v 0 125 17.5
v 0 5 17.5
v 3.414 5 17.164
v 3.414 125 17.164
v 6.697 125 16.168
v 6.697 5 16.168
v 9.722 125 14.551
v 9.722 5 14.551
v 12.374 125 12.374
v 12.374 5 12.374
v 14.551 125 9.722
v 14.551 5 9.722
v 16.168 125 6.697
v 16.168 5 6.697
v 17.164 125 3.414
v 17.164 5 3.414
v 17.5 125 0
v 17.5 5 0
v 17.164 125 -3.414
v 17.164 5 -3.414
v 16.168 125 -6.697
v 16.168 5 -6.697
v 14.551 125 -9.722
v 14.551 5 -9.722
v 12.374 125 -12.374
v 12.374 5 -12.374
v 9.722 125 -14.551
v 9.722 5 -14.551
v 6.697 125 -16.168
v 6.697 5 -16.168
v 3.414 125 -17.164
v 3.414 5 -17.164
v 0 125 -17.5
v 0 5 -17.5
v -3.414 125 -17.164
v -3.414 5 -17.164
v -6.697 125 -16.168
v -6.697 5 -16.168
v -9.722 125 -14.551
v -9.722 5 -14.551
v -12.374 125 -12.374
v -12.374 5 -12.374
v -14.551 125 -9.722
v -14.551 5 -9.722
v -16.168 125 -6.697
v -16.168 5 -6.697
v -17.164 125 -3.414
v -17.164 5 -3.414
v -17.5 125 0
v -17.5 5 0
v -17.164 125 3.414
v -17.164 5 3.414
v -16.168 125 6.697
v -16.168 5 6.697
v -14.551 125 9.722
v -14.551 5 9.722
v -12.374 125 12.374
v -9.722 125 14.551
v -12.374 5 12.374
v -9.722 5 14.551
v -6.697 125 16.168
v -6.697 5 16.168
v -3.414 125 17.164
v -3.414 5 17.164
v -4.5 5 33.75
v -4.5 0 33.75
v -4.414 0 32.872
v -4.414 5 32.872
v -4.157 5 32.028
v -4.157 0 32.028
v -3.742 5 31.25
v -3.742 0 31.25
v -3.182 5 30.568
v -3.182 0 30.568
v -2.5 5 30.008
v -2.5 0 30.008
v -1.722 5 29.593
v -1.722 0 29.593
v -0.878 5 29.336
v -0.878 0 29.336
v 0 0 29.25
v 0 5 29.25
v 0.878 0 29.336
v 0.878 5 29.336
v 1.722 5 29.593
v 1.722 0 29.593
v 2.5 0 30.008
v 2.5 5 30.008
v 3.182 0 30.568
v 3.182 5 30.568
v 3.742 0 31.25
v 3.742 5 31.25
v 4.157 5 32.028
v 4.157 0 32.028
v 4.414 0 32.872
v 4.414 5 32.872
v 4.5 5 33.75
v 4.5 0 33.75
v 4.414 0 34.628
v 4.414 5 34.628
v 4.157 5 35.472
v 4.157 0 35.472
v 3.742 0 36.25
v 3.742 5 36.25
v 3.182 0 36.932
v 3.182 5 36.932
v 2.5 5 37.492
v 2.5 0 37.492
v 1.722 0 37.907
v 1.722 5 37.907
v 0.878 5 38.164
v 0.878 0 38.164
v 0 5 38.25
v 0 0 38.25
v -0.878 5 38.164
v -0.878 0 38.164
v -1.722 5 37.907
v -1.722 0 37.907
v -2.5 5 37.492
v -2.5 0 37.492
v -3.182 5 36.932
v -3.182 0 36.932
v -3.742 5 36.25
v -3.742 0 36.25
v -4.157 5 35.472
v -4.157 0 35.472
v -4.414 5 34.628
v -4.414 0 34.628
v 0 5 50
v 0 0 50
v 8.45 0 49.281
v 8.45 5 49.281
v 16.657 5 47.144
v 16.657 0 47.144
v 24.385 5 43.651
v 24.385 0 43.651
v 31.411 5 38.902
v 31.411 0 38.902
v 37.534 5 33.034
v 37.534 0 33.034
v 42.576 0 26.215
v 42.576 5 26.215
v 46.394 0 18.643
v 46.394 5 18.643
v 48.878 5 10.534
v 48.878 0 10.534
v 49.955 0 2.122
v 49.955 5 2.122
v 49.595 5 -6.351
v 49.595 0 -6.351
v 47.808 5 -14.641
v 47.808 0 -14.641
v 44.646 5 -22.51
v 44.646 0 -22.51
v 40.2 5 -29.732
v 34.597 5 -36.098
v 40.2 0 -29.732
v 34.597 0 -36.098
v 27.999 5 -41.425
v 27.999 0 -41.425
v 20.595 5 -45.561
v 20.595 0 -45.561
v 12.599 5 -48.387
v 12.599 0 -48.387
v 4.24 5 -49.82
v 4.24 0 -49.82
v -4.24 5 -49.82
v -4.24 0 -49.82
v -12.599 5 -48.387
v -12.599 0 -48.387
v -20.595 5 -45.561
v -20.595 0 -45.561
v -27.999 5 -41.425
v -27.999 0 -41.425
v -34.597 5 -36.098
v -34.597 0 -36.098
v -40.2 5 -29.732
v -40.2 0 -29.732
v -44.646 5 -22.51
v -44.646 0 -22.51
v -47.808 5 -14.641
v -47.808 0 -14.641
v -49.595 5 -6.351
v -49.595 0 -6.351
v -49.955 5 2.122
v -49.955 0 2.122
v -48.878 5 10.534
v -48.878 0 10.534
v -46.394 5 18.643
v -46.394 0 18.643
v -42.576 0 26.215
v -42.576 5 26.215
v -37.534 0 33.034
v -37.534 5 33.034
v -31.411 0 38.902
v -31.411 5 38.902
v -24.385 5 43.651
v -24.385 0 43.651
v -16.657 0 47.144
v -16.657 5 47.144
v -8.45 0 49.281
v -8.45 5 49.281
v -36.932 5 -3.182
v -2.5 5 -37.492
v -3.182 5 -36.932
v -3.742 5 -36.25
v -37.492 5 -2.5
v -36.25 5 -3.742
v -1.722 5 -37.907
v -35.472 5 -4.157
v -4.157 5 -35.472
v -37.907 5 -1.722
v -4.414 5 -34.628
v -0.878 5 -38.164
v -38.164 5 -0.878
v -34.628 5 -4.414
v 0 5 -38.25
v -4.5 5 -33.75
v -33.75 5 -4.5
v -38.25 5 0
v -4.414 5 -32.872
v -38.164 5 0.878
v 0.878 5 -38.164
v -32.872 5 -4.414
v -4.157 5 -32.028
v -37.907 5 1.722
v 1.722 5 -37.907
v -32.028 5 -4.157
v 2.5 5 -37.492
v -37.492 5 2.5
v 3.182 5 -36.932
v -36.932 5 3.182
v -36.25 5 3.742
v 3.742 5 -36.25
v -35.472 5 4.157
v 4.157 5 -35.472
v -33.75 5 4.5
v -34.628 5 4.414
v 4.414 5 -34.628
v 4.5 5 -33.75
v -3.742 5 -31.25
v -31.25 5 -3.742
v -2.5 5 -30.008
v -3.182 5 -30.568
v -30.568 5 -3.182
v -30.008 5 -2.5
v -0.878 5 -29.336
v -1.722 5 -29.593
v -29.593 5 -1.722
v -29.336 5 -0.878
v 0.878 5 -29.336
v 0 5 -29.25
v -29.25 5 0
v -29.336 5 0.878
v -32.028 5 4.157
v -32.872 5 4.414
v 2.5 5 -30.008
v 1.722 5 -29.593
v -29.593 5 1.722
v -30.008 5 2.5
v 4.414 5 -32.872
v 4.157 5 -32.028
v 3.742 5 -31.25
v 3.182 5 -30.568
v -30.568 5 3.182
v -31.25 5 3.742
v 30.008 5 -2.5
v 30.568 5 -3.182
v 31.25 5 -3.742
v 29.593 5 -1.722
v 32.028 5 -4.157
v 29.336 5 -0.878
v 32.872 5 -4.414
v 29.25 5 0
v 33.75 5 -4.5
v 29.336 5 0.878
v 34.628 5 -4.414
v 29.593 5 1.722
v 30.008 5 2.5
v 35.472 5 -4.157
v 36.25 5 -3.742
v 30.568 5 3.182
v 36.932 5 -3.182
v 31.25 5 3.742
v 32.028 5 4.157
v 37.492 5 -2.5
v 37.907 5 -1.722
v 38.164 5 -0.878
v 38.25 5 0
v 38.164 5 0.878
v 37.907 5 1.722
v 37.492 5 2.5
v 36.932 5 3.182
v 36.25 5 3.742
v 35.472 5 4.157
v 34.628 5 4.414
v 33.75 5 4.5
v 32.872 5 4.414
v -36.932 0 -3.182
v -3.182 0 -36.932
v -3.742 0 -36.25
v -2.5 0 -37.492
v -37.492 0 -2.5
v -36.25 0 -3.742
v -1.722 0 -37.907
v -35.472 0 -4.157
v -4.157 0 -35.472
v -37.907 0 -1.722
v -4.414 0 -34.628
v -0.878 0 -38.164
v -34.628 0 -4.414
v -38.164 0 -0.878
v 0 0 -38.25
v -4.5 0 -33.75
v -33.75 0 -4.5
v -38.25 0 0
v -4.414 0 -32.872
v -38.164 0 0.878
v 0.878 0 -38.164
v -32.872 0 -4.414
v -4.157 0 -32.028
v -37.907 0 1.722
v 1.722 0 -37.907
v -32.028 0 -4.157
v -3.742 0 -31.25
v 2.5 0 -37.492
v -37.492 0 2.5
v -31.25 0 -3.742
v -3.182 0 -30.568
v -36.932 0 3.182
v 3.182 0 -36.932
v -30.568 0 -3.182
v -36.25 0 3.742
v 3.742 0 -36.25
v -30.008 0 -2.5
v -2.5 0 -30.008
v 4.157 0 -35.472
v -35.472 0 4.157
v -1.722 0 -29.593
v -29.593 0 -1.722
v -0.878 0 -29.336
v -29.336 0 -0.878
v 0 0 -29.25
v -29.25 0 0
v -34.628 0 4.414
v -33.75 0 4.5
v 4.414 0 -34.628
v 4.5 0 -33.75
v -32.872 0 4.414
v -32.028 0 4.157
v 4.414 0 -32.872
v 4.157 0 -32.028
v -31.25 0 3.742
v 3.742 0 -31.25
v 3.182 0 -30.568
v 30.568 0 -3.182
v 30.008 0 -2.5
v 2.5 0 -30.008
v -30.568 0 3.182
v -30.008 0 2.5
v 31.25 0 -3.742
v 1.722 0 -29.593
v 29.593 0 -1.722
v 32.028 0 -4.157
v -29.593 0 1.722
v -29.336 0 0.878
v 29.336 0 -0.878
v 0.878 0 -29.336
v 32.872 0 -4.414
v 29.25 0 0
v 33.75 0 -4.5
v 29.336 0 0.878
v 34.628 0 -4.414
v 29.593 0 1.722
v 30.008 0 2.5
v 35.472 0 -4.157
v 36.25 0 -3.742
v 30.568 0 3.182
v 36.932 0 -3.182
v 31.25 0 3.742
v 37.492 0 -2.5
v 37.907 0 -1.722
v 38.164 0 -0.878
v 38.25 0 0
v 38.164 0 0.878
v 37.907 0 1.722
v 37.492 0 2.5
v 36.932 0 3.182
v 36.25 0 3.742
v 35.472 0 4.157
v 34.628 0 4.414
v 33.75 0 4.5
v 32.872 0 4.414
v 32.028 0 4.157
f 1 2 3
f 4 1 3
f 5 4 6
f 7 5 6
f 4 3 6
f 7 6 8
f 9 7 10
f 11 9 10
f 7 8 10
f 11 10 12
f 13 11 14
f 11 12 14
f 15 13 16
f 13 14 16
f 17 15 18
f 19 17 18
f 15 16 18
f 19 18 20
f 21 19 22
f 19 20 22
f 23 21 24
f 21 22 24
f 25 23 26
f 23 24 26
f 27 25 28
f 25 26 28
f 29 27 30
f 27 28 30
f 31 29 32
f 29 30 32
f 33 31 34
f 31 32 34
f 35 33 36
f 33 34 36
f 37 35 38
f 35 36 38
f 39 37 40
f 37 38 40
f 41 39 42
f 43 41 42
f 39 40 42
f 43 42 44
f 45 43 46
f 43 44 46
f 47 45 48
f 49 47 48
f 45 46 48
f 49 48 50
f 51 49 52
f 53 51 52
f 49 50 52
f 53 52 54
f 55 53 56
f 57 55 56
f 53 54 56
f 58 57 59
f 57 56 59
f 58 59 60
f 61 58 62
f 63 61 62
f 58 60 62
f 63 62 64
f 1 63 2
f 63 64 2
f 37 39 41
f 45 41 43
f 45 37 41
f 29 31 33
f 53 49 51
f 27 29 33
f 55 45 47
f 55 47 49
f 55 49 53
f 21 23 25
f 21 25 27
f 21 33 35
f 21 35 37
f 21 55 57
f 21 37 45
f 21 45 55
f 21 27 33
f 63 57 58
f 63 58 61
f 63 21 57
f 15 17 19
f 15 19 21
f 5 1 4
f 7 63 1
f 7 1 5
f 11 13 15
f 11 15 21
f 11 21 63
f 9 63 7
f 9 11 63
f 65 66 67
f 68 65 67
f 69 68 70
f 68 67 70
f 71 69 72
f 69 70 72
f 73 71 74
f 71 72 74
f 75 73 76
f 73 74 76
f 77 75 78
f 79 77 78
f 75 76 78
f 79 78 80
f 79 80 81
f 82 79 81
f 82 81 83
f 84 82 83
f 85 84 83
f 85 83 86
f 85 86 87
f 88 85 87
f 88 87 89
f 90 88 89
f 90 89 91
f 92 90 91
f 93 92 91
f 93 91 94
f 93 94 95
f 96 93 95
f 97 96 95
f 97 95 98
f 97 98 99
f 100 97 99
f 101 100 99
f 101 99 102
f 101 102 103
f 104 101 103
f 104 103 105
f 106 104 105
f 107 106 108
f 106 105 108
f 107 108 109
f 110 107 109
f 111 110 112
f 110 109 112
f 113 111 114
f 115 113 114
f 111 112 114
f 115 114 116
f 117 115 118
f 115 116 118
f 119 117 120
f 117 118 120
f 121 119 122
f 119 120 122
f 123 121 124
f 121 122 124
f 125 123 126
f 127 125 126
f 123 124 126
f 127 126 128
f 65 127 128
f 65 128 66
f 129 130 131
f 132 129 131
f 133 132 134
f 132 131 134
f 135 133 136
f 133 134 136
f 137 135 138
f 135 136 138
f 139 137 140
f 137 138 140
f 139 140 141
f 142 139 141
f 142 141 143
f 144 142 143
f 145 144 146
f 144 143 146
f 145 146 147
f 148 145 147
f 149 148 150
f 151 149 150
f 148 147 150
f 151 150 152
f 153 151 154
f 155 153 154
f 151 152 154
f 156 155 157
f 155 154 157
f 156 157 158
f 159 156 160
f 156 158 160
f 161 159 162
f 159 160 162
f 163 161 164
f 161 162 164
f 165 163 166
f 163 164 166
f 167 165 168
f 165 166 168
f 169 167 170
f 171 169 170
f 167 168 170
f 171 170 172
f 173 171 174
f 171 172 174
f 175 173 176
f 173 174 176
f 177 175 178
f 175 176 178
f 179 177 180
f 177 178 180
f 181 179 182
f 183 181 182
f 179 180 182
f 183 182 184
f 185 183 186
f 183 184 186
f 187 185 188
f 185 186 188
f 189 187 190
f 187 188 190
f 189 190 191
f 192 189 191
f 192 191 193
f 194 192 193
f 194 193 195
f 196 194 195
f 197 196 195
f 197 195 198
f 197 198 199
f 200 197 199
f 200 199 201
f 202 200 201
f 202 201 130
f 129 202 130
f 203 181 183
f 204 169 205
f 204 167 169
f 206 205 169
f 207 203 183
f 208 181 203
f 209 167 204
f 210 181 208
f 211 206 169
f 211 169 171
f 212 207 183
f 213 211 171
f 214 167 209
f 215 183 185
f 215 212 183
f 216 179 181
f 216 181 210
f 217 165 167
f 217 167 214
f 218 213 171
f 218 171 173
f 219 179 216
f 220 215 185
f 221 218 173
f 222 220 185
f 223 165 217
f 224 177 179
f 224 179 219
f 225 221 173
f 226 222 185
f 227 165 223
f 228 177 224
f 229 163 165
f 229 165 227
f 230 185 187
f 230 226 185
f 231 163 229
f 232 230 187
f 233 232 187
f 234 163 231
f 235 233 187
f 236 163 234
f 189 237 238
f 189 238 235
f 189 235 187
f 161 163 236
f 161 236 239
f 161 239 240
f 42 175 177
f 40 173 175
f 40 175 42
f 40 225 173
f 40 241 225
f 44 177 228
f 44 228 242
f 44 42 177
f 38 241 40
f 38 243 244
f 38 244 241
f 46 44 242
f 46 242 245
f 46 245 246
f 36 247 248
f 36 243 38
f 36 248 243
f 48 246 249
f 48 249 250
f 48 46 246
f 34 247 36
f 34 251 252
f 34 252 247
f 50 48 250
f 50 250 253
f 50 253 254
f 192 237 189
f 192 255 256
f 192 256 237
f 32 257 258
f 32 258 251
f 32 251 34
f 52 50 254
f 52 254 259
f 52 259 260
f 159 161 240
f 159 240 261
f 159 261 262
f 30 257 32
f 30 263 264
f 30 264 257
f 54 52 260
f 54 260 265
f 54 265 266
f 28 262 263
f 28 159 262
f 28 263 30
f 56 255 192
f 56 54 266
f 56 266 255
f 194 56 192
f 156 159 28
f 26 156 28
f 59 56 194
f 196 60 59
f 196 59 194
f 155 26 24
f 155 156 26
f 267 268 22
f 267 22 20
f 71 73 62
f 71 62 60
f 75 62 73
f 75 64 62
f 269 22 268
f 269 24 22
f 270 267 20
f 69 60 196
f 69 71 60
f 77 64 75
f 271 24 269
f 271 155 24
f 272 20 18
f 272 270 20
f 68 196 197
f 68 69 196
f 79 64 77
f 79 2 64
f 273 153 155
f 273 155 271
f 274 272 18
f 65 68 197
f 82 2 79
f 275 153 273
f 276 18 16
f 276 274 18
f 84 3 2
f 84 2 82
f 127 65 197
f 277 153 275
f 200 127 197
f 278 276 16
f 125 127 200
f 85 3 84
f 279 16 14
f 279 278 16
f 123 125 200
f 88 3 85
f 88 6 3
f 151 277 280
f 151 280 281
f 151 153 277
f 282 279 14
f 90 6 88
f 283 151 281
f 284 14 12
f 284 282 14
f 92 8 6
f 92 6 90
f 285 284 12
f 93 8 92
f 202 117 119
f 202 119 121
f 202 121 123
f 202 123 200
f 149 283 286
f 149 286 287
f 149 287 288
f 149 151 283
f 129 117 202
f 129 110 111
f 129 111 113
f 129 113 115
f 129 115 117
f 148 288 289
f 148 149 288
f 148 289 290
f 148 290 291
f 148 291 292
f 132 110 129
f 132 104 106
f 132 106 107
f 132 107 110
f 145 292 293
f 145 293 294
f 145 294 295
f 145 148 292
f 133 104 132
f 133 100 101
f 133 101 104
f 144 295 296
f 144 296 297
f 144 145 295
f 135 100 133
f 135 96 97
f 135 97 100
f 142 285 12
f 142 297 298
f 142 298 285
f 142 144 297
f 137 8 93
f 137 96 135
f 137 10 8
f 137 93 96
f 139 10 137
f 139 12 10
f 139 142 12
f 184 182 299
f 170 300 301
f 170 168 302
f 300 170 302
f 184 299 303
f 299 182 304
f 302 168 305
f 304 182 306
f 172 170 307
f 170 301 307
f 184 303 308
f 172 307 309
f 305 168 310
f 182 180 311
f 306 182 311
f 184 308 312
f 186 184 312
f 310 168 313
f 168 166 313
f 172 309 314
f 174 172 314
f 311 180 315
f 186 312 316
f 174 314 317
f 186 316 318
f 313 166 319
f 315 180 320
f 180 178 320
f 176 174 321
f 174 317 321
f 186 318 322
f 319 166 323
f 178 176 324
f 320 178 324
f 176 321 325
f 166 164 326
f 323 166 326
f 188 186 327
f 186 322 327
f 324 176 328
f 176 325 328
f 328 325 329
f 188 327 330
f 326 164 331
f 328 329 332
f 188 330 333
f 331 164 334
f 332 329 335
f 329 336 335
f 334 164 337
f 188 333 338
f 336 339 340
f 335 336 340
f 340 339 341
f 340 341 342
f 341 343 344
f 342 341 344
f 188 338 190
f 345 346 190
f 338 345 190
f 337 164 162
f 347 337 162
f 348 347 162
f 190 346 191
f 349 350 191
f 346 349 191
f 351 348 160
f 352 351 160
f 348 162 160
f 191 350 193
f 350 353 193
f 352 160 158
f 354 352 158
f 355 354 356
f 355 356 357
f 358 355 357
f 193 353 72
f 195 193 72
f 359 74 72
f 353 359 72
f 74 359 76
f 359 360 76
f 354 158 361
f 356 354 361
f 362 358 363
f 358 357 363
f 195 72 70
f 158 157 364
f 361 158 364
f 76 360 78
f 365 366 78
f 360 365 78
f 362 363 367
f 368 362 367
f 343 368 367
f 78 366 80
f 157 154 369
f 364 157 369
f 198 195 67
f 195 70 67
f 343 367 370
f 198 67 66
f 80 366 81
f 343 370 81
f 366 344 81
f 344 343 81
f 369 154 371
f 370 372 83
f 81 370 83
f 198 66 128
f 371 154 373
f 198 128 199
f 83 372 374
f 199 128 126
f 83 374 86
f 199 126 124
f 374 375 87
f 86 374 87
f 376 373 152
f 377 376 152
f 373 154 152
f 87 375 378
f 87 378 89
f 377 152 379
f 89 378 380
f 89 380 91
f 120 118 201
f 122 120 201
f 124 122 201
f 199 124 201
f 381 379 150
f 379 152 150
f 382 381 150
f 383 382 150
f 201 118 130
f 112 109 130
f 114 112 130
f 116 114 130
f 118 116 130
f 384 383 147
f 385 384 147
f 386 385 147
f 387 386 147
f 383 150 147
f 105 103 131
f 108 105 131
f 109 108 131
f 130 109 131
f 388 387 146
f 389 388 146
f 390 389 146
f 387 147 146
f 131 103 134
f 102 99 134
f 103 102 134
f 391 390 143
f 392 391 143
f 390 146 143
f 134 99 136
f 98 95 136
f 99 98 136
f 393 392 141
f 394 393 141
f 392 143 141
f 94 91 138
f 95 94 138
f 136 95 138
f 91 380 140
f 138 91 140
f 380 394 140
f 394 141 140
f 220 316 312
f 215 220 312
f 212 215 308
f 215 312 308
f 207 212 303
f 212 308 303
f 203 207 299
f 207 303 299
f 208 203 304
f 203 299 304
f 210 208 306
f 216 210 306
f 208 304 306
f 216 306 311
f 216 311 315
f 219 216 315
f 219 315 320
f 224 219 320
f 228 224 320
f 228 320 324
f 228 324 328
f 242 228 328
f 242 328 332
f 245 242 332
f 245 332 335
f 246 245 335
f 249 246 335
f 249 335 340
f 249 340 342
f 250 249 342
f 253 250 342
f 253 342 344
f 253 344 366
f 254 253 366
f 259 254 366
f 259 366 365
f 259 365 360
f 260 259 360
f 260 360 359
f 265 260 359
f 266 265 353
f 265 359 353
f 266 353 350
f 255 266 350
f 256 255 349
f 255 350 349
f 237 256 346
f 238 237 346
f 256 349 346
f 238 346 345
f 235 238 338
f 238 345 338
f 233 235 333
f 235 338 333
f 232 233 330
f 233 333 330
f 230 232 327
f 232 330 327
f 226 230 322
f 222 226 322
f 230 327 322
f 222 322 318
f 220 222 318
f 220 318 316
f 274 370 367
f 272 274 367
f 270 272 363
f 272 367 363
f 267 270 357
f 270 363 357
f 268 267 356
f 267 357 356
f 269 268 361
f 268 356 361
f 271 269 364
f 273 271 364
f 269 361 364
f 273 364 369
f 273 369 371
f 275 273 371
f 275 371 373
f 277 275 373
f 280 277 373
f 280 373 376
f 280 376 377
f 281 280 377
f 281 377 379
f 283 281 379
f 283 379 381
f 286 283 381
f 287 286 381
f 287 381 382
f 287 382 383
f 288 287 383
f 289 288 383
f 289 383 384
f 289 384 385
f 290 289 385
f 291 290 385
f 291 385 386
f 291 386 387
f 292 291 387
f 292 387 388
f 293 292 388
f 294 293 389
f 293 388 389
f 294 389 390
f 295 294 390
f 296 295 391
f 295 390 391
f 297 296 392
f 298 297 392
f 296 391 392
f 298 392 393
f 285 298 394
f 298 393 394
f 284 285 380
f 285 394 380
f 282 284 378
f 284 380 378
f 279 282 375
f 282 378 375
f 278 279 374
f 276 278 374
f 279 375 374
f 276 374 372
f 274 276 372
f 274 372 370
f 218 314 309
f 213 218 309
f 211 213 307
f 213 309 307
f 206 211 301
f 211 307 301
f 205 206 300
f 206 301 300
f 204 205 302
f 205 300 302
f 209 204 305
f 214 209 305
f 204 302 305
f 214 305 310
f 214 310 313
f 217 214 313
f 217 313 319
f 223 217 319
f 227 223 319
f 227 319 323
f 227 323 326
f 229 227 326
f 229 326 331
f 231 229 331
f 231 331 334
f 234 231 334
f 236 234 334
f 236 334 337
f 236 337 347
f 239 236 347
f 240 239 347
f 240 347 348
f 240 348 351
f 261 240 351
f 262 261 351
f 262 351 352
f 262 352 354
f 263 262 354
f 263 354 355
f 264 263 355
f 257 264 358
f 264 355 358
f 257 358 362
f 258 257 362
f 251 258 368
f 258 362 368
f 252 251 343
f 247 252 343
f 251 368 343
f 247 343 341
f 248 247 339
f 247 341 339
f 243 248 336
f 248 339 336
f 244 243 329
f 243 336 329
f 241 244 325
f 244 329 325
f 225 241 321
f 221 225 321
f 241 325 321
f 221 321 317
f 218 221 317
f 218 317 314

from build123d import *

# Parameters (mm, degrees)
SZKIC1_R                    = 50
DODANIE_WYCI_GNI_CIE1_DEPTH = 5
SZKIC2_R                    = 17.5
DODANIE_WYCI_GNI_CIE2_DEPTH = 120
OTW_R_POD_RUB_M81_D         = 9


with BuildPart() as part:
    # Szkic1 → Dodanie-wyciągnięcie1 (new body)
    with BuildSketch(Plane(origin=(0, 0, 0), x_dir=(1, 0, 0), z_dir=(0, 1, 0))):
        with Locations(Location((0, 0, 0), (0, 0, 270))):
            Circle(SZKIC1_R)
    extrude(amount=DODANIE_WYCI_GNI_CIE1_DEPTH)

    # Szkic2 → Dodanie-wyciągnięcie2 (add)
    with BuildSketch(Plane(origin=(0, 5, 0), x_dir=(1, 0, 0), z_dir=(0, 1, 0))):
        with Locations(Location((0, 0, 0), (0, 0, 270))):
            Circle(SZKIC2_R)
    extrude(amount=DODANIE_WYCI_GNI_CIE2_DEPTH)

    # Otwór pod śrubę M81 (through all)
    with Locations(Plane(origin=(0, 5, 0), x_dir=(1, 0, 0), z_dir=(0, 1, 0))):
        with Locations((-33.75, 0), (0, 33.75), (0, -33.75), (33.75, 0)):
            Hole(OTW_R_POD_RUB_M81_D / 2)


solid = part.part
